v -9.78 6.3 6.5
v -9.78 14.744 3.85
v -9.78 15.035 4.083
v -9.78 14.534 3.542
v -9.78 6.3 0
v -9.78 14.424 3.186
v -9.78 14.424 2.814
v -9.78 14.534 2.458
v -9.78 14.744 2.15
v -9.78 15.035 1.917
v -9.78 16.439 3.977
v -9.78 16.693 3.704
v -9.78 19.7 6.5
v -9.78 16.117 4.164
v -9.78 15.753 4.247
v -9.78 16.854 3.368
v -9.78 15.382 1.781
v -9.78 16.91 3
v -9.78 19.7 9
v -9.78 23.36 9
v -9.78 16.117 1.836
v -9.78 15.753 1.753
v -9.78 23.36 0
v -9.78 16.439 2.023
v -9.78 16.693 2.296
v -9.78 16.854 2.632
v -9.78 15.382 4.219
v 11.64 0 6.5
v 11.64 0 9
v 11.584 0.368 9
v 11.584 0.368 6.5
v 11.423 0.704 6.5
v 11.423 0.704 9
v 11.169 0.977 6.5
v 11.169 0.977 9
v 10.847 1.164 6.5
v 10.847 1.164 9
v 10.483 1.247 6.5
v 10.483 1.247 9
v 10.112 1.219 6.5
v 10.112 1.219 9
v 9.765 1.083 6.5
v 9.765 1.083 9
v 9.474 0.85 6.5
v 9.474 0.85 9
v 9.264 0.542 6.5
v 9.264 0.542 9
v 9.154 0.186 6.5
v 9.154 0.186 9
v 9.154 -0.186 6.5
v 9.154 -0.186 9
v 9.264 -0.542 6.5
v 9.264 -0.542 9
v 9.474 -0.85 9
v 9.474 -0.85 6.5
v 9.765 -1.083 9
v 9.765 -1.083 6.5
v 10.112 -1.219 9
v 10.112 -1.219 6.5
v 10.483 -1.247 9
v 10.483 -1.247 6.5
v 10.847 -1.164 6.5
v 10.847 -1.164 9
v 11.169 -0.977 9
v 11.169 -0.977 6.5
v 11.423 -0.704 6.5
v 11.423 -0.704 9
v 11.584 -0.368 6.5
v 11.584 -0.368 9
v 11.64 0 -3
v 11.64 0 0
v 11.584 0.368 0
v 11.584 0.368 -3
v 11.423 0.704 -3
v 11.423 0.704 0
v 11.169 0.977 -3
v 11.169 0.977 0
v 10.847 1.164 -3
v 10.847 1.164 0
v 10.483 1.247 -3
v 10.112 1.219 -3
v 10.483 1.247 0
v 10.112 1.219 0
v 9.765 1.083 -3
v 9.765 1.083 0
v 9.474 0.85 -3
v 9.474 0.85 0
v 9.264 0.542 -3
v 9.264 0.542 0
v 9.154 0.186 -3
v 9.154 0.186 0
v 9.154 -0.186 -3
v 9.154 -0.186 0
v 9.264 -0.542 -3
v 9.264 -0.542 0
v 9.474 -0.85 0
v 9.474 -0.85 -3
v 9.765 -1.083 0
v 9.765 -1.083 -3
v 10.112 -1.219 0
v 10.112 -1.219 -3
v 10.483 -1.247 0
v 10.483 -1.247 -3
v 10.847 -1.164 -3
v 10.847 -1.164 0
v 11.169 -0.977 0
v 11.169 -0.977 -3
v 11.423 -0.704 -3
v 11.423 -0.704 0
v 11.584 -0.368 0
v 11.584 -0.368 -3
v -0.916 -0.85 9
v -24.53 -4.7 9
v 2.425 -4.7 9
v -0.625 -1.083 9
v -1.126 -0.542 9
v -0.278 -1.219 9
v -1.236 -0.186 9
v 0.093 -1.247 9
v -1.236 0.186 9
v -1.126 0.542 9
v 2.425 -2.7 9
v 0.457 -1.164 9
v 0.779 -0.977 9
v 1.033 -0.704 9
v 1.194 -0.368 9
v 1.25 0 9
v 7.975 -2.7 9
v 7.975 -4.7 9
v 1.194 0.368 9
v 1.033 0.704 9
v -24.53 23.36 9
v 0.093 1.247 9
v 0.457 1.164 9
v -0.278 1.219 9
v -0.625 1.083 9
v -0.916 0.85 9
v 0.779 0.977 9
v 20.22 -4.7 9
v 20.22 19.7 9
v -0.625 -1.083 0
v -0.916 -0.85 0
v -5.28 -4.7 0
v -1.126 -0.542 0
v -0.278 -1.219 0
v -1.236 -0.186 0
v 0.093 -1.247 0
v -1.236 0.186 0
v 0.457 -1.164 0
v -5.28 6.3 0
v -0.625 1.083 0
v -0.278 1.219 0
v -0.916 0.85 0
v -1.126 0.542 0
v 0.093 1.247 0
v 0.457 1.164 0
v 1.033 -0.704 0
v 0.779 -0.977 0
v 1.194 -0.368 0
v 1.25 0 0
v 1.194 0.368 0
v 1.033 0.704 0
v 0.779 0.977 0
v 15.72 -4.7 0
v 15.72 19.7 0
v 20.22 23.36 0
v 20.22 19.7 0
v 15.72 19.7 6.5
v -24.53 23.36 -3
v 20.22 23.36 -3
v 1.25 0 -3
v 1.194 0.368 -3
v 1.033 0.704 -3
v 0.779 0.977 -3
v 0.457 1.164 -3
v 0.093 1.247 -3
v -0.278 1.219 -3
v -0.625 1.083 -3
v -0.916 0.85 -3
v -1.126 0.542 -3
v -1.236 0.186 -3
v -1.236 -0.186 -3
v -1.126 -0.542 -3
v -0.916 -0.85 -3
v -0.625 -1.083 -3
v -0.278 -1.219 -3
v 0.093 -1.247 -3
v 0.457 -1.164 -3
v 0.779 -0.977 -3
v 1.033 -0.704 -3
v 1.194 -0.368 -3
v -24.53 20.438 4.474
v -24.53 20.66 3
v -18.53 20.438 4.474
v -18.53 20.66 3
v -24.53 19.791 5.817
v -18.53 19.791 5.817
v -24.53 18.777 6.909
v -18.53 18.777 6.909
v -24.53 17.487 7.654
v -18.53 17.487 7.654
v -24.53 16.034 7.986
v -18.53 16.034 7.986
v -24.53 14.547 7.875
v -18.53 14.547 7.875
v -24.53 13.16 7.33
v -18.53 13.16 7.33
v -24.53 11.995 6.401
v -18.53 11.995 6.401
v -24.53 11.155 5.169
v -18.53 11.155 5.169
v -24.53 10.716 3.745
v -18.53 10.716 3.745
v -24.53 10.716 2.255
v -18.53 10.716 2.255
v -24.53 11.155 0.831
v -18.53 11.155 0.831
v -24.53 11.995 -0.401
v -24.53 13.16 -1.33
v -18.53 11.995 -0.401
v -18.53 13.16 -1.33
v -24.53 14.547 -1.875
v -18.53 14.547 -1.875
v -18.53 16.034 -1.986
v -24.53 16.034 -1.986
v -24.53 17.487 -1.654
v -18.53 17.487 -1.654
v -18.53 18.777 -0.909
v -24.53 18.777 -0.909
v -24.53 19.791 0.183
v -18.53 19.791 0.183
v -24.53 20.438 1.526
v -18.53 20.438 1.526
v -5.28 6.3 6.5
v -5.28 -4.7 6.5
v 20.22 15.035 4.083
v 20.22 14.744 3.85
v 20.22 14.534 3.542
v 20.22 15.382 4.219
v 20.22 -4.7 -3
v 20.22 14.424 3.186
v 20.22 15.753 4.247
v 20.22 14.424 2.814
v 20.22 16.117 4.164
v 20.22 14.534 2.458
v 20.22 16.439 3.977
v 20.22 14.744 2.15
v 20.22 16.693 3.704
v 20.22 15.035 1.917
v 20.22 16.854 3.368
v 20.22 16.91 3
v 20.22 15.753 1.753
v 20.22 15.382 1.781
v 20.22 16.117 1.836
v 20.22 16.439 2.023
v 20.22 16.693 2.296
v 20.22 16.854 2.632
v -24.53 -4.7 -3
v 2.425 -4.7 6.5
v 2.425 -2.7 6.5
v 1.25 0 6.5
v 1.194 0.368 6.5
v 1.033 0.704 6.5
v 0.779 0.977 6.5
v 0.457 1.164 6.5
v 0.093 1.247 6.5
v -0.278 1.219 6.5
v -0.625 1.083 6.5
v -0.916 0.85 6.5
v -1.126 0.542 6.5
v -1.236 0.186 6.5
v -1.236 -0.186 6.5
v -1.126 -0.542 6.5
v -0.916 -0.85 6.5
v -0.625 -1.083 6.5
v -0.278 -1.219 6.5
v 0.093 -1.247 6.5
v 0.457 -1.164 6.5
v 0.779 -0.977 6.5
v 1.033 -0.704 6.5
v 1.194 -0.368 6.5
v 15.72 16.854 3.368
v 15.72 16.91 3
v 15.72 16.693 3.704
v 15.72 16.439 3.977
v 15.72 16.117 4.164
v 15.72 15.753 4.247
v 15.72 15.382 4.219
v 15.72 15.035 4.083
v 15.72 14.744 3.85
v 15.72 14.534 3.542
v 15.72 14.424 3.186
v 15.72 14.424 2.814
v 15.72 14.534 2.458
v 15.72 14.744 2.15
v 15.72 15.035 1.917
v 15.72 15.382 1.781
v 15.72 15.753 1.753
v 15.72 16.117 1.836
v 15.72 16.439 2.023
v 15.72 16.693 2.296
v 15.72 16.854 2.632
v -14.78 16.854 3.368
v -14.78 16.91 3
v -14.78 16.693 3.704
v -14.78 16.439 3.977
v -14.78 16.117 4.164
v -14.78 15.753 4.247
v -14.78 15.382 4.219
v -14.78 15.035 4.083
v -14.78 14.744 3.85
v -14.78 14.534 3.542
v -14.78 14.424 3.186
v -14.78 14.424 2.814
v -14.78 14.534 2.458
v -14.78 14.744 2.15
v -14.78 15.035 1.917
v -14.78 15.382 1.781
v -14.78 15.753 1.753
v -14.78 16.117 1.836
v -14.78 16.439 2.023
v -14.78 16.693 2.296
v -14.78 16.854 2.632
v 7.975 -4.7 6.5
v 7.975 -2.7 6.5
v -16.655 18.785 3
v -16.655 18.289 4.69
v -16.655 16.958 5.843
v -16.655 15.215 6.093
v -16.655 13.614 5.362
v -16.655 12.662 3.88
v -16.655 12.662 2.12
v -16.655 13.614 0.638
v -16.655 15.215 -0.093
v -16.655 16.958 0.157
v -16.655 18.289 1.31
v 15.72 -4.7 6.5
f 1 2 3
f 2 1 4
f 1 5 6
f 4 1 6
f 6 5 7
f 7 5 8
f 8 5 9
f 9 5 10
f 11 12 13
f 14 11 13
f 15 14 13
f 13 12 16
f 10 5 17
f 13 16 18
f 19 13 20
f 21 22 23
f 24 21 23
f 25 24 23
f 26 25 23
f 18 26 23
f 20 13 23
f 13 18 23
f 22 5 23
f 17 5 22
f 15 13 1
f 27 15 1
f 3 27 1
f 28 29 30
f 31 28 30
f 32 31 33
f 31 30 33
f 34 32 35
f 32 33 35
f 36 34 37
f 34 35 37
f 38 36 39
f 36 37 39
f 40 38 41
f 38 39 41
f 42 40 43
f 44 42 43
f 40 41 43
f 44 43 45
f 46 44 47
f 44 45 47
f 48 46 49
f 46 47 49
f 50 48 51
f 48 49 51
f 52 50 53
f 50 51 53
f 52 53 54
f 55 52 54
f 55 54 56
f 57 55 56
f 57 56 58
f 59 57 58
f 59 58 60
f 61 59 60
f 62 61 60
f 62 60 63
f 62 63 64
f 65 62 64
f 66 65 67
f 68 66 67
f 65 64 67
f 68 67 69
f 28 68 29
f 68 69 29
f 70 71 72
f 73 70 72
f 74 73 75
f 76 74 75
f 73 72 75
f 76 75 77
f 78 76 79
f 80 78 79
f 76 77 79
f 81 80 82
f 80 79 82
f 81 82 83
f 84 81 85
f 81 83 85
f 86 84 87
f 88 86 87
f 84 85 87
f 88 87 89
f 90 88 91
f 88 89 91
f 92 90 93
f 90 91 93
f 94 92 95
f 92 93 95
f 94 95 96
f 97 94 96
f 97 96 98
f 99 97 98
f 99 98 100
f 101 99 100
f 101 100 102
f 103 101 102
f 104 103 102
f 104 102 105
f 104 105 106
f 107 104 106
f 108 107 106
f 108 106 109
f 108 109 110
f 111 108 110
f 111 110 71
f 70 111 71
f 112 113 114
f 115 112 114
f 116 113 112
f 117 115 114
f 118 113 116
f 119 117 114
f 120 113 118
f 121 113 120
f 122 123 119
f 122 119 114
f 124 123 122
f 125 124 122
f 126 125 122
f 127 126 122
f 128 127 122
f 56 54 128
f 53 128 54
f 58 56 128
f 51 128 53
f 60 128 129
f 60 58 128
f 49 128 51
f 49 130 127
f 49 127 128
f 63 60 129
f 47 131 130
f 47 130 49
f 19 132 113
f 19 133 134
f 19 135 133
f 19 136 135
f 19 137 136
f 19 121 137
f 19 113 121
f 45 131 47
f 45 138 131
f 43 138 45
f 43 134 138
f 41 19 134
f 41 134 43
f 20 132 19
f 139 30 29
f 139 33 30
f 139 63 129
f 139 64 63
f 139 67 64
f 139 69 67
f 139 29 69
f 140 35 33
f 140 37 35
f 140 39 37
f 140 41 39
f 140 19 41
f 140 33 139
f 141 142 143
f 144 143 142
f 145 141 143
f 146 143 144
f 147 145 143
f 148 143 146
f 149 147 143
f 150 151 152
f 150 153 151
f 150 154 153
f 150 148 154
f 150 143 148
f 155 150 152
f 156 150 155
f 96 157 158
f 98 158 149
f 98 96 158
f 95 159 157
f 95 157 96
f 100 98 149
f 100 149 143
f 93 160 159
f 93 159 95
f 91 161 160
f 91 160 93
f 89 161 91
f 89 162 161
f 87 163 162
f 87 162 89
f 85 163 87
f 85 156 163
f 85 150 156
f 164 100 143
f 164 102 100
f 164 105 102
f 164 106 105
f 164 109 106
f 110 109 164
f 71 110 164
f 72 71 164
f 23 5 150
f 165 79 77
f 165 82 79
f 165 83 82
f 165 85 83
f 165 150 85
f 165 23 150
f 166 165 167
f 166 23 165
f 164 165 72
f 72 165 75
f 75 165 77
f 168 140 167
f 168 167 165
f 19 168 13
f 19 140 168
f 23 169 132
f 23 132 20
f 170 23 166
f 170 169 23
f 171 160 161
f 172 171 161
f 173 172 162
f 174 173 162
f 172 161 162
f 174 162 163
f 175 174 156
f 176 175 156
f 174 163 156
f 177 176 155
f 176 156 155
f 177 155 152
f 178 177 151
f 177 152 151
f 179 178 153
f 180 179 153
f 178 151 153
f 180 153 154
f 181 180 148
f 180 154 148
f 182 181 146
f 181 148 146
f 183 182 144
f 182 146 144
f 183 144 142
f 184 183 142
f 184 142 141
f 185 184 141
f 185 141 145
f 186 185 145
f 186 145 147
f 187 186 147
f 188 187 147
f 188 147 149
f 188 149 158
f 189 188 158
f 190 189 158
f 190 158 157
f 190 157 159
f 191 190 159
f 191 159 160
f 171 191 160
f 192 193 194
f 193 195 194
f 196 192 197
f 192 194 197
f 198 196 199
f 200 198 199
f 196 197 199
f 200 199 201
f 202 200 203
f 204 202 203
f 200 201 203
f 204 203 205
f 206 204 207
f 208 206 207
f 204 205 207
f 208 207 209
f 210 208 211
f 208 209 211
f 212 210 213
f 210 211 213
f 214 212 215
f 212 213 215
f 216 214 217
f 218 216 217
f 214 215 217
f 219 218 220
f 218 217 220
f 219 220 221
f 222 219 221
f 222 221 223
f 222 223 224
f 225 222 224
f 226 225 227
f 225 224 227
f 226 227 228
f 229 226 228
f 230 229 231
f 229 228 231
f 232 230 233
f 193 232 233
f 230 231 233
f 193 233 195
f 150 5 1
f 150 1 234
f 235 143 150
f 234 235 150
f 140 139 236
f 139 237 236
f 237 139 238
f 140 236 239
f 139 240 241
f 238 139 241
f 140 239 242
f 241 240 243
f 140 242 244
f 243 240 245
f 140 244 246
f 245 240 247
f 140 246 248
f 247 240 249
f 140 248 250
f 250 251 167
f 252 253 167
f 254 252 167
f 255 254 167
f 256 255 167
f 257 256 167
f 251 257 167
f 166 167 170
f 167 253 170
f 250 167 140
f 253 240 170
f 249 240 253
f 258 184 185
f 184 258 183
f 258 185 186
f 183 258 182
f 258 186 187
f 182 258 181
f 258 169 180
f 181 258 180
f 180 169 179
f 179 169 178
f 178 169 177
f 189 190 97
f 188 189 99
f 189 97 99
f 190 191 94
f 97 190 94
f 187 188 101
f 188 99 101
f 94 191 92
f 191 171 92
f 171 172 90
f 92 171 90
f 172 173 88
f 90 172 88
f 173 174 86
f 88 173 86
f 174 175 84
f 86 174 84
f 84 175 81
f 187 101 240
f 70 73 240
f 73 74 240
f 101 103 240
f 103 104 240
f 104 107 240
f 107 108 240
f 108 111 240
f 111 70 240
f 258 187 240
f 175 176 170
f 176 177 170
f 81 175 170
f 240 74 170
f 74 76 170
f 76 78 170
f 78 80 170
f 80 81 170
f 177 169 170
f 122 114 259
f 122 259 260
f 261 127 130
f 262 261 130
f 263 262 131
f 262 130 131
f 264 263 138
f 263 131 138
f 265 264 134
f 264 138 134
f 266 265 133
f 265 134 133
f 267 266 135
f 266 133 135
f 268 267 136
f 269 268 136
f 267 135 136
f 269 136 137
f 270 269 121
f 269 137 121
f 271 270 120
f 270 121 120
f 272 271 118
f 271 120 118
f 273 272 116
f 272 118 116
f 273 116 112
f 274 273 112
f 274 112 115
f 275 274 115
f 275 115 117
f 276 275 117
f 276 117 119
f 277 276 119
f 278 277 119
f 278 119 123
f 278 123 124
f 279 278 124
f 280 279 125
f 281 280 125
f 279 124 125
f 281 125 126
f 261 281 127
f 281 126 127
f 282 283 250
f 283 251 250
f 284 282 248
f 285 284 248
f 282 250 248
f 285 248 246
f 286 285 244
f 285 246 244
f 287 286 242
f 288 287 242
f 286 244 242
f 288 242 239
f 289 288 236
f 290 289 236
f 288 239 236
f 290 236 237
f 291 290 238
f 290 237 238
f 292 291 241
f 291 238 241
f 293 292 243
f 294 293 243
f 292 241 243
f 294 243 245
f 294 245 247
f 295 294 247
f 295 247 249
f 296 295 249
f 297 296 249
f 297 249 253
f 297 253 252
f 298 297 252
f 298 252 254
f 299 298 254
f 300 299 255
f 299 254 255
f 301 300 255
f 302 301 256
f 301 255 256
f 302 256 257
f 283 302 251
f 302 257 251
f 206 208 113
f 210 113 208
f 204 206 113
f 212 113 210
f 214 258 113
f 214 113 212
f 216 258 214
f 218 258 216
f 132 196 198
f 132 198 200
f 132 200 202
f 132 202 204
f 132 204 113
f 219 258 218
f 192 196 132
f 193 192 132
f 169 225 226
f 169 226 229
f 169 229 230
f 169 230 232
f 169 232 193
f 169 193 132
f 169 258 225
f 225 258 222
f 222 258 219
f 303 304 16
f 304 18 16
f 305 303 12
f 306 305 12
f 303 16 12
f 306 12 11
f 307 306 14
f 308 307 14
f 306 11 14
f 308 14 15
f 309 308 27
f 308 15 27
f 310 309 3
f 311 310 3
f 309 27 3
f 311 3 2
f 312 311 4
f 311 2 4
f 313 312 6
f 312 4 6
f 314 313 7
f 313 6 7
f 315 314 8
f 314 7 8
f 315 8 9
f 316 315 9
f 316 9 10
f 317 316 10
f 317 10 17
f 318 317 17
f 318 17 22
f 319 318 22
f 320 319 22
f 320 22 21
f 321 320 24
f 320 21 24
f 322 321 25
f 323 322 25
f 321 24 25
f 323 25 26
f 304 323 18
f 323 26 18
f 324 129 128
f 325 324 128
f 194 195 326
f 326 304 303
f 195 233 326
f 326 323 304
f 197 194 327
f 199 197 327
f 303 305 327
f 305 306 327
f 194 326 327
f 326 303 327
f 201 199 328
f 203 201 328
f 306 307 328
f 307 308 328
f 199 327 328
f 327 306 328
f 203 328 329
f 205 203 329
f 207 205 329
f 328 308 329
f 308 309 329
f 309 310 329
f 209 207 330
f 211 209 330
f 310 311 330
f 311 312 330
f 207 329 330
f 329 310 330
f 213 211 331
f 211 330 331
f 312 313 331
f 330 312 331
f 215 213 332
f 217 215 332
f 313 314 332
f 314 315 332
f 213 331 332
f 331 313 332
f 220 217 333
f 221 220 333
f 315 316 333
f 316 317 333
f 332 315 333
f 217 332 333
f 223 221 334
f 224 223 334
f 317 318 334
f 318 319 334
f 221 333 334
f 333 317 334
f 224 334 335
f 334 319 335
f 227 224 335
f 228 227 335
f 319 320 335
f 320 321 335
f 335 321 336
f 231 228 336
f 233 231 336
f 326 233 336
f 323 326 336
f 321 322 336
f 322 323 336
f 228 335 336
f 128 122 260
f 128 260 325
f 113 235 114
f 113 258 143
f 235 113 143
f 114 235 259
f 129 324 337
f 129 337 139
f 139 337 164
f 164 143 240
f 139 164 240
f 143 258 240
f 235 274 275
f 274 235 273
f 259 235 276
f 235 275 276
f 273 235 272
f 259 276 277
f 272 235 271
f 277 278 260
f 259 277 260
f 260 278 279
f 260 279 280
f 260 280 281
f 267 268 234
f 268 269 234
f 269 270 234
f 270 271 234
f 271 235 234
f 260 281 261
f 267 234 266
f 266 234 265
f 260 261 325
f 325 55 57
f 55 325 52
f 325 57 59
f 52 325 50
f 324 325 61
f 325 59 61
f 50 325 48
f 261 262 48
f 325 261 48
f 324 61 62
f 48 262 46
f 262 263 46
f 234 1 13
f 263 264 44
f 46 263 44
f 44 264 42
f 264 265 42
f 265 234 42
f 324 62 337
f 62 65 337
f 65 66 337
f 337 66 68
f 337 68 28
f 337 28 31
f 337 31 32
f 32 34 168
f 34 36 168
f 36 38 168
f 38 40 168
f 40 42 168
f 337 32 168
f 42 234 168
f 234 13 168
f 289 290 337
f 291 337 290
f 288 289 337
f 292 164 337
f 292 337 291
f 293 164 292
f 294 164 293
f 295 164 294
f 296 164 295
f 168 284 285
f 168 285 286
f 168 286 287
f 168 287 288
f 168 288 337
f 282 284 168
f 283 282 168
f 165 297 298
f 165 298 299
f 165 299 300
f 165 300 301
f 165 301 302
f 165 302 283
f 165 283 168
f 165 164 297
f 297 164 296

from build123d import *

# Parameters (mm, degrees)
SKETCH1_W              = 30
SKETCH1_H              = 24.4
BOSS_EXTRUDE1_DEPTH    = 3
SKETCH1_5_R            = 1.25
CUT_EXTRUDE1_DEPTH     = 6
BOSS_EXTRUDE3_START    = -3
BOSS_EXTRUDE3_DEPTH    = 3
SKETCH1_6_W            = 4.5
SKETCH1_6_H            = 11
SKETCH1_6_H_2          = 24.4
BOSS_EXTRUDE4_DEPTH    = 9
BOSS_EXTRUDE5_START    = -3
SKETCH2_6_W            = 14.75
SKETCH2_6_H            = 28.06
BOSS_EXTRUDE5_DEPTH    = 9
CUT_REVOLVE1_OUTLINE_W = 1.25
CUT_REVOLVE1_OUTLINE_H = 4.5
BOSS_EXTRUDE7_START    = 9
SKETCH1_7_W            = 2.25
SKETCH1_7_H            = 2
SKETCH1_7_W_2          = 6.505
SKETCH1_7_W_3          = 1.2
SKETCH1_7_W_4          = 6.495
SKETCH1_7_W_5          = 1.25
SKETCH1_7_R            = 1.25
BOSS_EXTRUDE7_DEPTH    = 2.5


# Read off the part's stored shape, not the designer's step: Cut-Revolve1
with BuildPart() as part:
    # Sketch1 → Boss-Extrude1 (new body)
    with BuildSketch(Plane.XY):
        with Locations((5.22, 7.5)):
            Rectangle(SKETCH1_W, SKETCH1_H)
    extrude(amount=-BOSS_EXTRUDE1_DEPTH)

    # Sketch1<5> → Cut-Extrude1 (cut)
    with BuildSketch(Plane.XY):
        Circle(SKETCH1_5_R)
        with Locations((10.39, 0)):
            Circle(SKETCH1_5_R)
    extrude(amount=-CUT_EXTRUDE1_DEPTH, mode=Mode.SUBTRACT)

    # Sketch2 → Boss-Extrude3 (add)
    with BuildSketch(Plane.XY.offset(3).offset(BOSS_EXTRUDE3_START)):
        Polygon((-9.78, -4.7), (-9.78, 16.91), (-4.78, 16.91), (-4.78, 19.7), (20.22, 19.7), (20.22, 23.36), (-24.53, 23.36), (-24.53, -4.7), align=None)
    extrude(amount=-BOSS_EXTRUDE3_DEPTH)

    # Sketch1<6> → Boss-Extrude4 (add)
    with BuildSketch(Plane.XY):
        with Locations((-7.53, 0.8)):
            Rectangle(SKETCH1_6_W, SKETCH1_6_H)
        with Locations((17.97, 7.5)):
            Rectangle(SKETCH1_6_W, SKETCH1_6_H_2)
    extrude(amount=BOSS_EXTRUDE4_DEPTH)

    # Sketch2<6> → Boss-Extrude5 (add)
    with BuildSketch(Plane.XY.offset(3).offset(BOSS_EXTRUDE5_START)):
        with Locations((-17.155, 9.33)):
            Rectangle(SKETCH2_6_W, SKETCH2_6_H)
    extrude(amount=BOSS_EXTRUDE5_DEPTH)

    # Cut-Revolve1 outline → Cut-Revolve1 (revolve, cut)
    with BuildSketch(Plane(origin=(0, 15.66, 3), x_dir=(0, 1, 0), z_dir=(0, 0, -1))):
        Polygon((5, -24.53), (5, -18.53), (1.25, -14.78), (1.25, -9.78), (0, -9.78), (0, -24.53), align=None)
        with Locations((0.625, 17.97)):
            Rectangle(CUT_REVOLVE1_OUTLINE_W, CUT_REVOLVE1_OUTLINE_H)
    revolve(axis=Axis((0, 15.66, 3), (1, 0, 0)), mode=Mode.SUBTRACT)

    # Sketch1<7> → Boss-Extrude7 (add)
    # profile 1 of 9: a face of its own
    with BuildSketch(Plane.XY.offset(BOSS_EXTRUDE7_START)):
        Polygon((-9.78, 19.7), (-9.78, 9.7), (13.47, 9.7), (15.72, 9.7), (15.72, 19.7), align=None)
    # profile 2 of 9: a face of its own
    with BuildSketch(Plane.XY.offset(BOSS_EXTRUDE7_START)):
        Polygon((13.47, 9.7), (-9.78, 9.7), (-9.78, 7.8), (-5.28, 7.8), (-5.28, 7.4), (-5.28, -2.7), (15.72, -2.7), (15.72, 7.7), (13.47, 7.7), align=None)
        with BuildLine():
            Line((-5.08, -2), (-5.08, 6.2))
            ThreePointArc((-5.08, 6.2), (-4.787106781, 6.907106781), (-4.08, 7.2))
            Line((-4.08, 7.2), (3.92, 7.2))
            Line((3.92, 7.2), (3.92, 7.5))
            Line((3.92, 7.5), (14.47, 7.5))
            ThreePointArc((14.47, 7.5), (15.177106781, 7.207106781), (15.47, 6.5))
            Line((15.47, 6.5), (15.47, -2))
            ThreePointArc((15.47, -2), (15.323553391, -2.353553391), (14.97, -2.5))
            Line((14.97, -2.5), (-4.58, -2.5))
            ThreePointArc((-4.58, -2.5), (-4.933553391, -2.353553391), (-5.08, -2))
        make_face(mode=Mode.SUBTRACT)
    # profile 3 of 9: a face of its own
    with BuildSketch(Plane.XY.offset(BOSS_EXTRUDE7_START)):
        Polygon((-5.28, 6.3), (-5.28, 7.4), (-5.28, 7.8), (-9.78, 7.8), (-9.78, 6.3), align=None)
    # profile 4 of 9: a face of its own
    with BuildSketch(Plane.XY.offset(BOSS_EXTRUDE7_START)):
        with Locations((14.595, 8.7)):
            Rectangle(SKETCH1_7_W, SKETCH1_7_H)
    # profile 5 of 9: a face of its own
    with BuildSketch(Plane.XY.offset(BOSS_EXTRUDE7_START)):
        with Locations((-0.8275, -3.7)):
            Rectangle(SKETCH1_7_W_2, SKETCH1_7_H)
    # profile 6 of 9: a face of its own
    with BuildSketch(Plane.XY.offset(BOSS_EXTRUDE7_START)):
        with Locations((-4.68, -3.7)):
            Rectangle(SKETCH1_7_W_3, SKETCH1_7_H)
    # profile 7 of 9: a face of its own
    with BuildSketch(Plane.XY.offset(BOSS_EXTRUDE7_START)):
        with Locations((11.2225, -3.7)):
            Rectangle(SKETCH1_7_W_4, SKETCH1_7_H)
    # profile 8 of 9: a face of its own
    with BuildSketch(Plane.XY.offset(BOSS_EXTRUDE7_START)):
        with Locations((15.095, -3.7)):
            Rectangle(SKETCH1_7_W_5, SKETCH1_7_H)
    # profile 9 of 9: a face of its own
    with BuildSketch(Plane.XY.offset(BOSS_EXTRUDE7_START)):
        with BuildLine():
            ThreePointArc((-5.08, 6.2), (-4.787106781, 6.907106781), (-4.08, 7.2))
            Line((-4.08, 7.2), (3.92, 7.2))
            Line((3.92, 7.2), (3.92, 7.5))
            Line((3.92, 7.5), (14.47, 7.5))
            ThreePointArc((14.47, 7.5), (15.177106781, 7.207106781), (15.47, 6.5))
            Line((15.47, 6.5), (15.47, -2))
            ThreePointArc((15.47, -2), (15.323553391, -2.353553391), (14.97, -2.5))
            Line((14.97, -2.5), (-4.58, -2.5))
            ThreePointArc((-4.58, -2.5), (-4.933553391, -2.353553391), (-5.08, -2))
            Line((-5.08, -2), (-5.08, 6.2))
        make_face()
        with Locations((10.39, 0)):
            Circle(SKETCH1_7_R, mode=Mode.SUBTRACT)
        Circle(SKETCH1_7_R, mode=Mode.SUBTRACT)
    extrude(amount=-BOSS_EXTRUDE7_DEPTH)


solid = part.part
